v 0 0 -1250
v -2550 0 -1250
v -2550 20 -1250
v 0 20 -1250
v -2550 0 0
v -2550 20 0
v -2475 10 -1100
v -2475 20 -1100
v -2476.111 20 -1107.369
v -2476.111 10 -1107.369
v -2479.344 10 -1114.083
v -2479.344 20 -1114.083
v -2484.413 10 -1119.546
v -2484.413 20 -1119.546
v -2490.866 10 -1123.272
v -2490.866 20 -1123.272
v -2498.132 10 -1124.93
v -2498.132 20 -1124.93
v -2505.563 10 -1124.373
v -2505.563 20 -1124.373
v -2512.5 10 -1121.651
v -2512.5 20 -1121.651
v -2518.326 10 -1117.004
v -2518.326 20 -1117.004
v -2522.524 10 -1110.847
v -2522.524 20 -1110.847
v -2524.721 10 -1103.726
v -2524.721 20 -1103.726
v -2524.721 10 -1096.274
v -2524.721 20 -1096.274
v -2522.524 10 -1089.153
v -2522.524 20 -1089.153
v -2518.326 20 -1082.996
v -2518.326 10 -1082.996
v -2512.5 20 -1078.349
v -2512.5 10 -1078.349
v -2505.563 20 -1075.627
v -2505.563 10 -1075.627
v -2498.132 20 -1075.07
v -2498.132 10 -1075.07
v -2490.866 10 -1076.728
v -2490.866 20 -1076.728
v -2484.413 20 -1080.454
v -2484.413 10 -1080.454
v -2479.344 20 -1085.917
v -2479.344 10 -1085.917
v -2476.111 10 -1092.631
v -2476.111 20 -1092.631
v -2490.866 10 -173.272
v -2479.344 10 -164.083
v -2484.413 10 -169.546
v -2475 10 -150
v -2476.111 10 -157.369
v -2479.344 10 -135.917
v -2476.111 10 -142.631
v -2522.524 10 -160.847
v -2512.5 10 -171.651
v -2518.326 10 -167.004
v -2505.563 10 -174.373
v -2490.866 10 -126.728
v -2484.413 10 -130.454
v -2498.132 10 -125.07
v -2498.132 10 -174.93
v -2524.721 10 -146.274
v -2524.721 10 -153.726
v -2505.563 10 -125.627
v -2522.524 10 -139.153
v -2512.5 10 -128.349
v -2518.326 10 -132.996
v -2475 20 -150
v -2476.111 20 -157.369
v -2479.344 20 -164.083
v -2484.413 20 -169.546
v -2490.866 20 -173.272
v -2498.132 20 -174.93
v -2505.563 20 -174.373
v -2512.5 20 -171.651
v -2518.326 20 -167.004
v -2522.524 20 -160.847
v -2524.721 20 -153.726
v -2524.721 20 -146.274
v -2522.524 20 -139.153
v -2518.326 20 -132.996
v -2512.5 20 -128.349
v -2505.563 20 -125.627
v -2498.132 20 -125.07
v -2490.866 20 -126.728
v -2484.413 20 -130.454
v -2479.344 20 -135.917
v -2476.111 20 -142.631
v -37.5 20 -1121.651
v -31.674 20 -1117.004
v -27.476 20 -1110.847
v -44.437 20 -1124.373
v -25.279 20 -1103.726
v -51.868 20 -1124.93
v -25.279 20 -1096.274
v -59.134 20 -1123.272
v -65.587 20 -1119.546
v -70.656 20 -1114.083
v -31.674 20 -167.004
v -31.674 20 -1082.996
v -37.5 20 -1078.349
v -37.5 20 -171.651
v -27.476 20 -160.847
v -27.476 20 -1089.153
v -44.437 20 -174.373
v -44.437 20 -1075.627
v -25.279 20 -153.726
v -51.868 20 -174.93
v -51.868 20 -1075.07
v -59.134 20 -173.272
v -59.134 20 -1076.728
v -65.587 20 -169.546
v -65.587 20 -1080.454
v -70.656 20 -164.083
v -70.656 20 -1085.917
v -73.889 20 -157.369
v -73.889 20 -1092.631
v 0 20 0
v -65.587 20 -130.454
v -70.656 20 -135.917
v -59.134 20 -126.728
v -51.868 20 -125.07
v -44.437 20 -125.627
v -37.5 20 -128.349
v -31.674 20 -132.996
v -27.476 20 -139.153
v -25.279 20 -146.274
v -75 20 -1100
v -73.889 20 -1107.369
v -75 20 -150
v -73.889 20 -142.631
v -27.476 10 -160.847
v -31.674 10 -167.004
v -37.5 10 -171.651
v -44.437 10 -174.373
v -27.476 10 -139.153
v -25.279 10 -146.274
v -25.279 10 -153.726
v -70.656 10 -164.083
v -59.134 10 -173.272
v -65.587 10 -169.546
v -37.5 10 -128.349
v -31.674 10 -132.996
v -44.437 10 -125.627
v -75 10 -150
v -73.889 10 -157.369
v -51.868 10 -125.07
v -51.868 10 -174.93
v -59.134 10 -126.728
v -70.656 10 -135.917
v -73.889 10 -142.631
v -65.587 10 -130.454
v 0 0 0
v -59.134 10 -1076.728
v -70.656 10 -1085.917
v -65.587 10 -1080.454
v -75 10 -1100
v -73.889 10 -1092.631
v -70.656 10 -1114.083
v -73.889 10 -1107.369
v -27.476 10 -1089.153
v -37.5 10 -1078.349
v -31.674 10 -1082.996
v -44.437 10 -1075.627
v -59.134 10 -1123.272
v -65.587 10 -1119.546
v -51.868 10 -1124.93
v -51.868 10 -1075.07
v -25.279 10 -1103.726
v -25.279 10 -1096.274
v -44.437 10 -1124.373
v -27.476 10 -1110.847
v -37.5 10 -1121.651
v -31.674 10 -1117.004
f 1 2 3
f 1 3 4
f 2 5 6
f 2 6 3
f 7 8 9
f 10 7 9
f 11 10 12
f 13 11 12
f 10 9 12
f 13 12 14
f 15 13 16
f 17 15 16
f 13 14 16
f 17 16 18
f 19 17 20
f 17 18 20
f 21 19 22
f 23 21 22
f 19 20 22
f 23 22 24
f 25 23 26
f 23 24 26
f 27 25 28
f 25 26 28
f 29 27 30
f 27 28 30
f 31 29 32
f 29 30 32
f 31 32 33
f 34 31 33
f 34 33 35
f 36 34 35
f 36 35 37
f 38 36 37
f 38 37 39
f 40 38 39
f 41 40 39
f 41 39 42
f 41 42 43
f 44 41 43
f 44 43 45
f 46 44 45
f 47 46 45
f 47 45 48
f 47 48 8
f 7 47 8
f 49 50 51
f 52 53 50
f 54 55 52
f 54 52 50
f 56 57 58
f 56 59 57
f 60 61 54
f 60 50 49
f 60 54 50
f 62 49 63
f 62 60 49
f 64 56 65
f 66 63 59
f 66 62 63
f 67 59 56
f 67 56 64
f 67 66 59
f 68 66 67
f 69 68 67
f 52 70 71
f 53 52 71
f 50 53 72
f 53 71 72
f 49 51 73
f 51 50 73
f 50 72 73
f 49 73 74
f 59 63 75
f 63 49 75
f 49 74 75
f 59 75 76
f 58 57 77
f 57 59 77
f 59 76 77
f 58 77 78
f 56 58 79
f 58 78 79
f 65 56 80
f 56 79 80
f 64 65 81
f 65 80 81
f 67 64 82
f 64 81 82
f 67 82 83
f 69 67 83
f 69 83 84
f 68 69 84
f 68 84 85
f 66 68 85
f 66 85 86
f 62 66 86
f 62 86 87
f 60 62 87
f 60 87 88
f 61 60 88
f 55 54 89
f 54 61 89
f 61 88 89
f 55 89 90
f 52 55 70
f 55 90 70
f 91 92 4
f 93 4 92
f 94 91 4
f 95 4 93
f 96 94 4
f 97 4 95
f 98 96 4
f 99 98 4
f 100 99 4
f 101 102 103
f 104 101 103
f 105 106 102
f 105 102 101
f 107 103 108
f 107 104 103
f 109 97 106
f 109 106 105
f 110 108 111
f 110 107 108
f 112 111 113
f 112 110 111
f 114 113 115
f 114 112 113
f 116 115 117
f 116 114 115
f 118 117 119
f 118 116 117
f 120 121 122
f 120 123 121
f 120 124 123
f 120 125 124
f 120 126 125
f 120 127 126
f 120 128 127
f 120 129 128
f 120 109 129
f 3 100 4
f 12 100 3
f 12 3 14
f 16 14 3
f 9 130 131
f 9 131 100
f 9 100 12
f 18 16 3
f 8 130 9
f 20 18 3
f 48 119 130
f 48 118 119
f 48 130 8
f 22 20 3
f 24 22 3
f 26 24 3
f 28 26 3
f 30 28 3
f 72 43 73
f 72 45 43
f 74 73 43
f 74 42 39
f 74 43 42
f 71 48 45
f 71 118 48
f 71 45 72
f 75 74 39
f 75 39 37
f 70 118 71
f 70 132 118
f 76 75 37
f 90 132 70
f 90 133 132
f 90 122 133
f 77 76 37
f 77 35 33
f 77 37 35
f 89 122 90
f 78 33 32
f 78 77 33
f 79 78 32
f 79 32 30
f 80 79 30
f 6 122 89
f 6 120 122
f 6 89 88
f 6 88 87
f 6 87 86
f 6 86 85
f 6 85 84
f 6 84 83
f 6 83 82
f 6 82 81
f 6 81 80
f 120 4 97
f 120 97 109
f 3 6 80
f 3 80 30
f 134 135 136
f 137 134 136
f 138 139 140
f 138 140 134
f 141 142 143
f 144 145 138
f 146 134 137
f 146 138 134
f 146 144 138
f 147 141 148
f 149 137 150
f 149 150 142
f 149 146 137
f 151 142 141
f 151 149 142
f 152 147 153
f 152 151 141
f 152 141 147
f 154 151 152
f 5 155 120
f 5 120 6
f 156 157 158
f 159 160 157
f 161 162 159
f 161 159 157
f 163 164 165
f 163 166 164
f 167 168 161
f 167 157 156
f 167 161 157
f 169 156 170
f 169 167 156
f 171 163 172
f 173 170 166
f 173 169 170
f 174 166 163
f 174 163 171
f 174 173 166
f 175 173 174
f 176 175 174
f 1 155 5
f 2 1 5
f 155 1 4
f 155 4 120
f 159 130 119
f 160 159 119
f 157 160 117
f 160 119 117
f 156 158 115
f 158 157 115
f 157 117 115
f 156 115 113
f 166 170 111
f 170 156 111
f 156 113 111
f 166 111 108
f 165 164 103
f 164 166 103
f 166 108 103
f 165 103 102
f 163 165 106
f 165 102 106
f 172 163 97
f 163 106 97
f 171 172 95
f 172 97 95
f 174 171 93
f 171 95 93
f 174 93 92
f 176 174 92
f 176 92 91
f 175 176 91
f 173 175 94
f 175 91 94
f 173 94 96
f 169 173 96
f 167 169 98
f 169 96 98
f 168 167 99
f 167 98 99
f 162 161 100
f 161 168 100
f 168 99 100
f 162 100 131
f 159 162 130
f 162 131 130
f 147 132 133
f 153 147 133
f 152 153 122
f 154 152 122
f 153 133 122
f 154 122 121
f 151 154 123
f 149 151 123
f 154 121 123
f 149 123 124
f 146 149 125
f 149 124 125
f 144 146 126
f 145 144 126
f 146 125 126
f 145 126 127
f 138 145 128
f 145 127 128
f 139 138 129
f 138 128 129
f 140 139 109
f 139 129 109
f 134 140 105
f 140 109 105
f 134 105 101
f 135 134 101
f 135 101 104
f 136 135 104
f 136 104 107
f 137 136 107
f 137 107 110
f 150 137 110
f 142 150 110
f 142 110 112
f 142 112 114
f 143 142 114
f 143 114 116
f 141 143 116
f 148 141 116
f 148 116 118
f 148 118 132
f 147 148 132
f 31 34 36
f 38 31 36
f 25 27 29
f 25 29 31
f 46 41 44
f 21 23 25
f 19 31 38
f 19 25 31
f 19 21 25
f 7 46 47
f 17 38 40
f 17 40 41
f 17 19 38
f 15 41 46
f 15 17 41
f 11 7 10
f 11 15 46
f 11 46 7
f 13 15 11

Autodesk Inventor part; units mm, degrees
ref_plane "YZ Plane" through (0, 0, 0) normal (1, 0, 0) x (0, 1, 0)
sketch "Sketch1" plane through (0, 0, 0) normal (0, 1, 0) x (-1, 0, 0)
  line L0 (0, 0) -> (2550, 0)
  line L1 (2550, 0) -> (2550, -1250)
  line L2 (2550, -1250) -> (0, -1250)
  line L3 (0, -1250) -> (0, 0)
  dimension "d0" = 1250
  dimension "d1" = 2550
extrude "Extrusion1" add sketch "Sketch1" along normal blind 20
sketch "Sketch2" plane through (0, 20, 0) normal (0, 1, 0) x (1, 0, 0)
  line L0 (-2550, 0) -> (0, 0) projected
  line L1 (0, 0) -> (0, 1250) projected
  line L2 (0, 1250) -> (-2550, 1250) projected
  line L3 (-2550, 1250) -> (-2550, 0) projected
  circle A0 centre (-2500, 1100) radius 25
  dimension "d4" = 50
  dimension "d5" = 1250
  dimension "d6" = 150
  dimension "d7" = 50
ref_plane "Work Plane1" through (-1275, 0, -1250) normal (-1, 0, 0) x (0, 0, 1)
ref_plane "Work Plane2" through (0, 0, -625) normal (0, 0, -1) x (-1, 0, 0)
extrude "Extrusion2" cut sketch "Sketch2" against normal blind 10 contours A0
mirror "Mirror1" about plane through (0, 0, -625) normal (0, 0, -1) of "Extrusion2"
mirror "Mirror2" about plane through (-1275, 0, -1250) normal (-1, 0, 0) of "Extrusion2", "Mirror1"
properties part number "Led Plater" material "Aluminum 6061"
